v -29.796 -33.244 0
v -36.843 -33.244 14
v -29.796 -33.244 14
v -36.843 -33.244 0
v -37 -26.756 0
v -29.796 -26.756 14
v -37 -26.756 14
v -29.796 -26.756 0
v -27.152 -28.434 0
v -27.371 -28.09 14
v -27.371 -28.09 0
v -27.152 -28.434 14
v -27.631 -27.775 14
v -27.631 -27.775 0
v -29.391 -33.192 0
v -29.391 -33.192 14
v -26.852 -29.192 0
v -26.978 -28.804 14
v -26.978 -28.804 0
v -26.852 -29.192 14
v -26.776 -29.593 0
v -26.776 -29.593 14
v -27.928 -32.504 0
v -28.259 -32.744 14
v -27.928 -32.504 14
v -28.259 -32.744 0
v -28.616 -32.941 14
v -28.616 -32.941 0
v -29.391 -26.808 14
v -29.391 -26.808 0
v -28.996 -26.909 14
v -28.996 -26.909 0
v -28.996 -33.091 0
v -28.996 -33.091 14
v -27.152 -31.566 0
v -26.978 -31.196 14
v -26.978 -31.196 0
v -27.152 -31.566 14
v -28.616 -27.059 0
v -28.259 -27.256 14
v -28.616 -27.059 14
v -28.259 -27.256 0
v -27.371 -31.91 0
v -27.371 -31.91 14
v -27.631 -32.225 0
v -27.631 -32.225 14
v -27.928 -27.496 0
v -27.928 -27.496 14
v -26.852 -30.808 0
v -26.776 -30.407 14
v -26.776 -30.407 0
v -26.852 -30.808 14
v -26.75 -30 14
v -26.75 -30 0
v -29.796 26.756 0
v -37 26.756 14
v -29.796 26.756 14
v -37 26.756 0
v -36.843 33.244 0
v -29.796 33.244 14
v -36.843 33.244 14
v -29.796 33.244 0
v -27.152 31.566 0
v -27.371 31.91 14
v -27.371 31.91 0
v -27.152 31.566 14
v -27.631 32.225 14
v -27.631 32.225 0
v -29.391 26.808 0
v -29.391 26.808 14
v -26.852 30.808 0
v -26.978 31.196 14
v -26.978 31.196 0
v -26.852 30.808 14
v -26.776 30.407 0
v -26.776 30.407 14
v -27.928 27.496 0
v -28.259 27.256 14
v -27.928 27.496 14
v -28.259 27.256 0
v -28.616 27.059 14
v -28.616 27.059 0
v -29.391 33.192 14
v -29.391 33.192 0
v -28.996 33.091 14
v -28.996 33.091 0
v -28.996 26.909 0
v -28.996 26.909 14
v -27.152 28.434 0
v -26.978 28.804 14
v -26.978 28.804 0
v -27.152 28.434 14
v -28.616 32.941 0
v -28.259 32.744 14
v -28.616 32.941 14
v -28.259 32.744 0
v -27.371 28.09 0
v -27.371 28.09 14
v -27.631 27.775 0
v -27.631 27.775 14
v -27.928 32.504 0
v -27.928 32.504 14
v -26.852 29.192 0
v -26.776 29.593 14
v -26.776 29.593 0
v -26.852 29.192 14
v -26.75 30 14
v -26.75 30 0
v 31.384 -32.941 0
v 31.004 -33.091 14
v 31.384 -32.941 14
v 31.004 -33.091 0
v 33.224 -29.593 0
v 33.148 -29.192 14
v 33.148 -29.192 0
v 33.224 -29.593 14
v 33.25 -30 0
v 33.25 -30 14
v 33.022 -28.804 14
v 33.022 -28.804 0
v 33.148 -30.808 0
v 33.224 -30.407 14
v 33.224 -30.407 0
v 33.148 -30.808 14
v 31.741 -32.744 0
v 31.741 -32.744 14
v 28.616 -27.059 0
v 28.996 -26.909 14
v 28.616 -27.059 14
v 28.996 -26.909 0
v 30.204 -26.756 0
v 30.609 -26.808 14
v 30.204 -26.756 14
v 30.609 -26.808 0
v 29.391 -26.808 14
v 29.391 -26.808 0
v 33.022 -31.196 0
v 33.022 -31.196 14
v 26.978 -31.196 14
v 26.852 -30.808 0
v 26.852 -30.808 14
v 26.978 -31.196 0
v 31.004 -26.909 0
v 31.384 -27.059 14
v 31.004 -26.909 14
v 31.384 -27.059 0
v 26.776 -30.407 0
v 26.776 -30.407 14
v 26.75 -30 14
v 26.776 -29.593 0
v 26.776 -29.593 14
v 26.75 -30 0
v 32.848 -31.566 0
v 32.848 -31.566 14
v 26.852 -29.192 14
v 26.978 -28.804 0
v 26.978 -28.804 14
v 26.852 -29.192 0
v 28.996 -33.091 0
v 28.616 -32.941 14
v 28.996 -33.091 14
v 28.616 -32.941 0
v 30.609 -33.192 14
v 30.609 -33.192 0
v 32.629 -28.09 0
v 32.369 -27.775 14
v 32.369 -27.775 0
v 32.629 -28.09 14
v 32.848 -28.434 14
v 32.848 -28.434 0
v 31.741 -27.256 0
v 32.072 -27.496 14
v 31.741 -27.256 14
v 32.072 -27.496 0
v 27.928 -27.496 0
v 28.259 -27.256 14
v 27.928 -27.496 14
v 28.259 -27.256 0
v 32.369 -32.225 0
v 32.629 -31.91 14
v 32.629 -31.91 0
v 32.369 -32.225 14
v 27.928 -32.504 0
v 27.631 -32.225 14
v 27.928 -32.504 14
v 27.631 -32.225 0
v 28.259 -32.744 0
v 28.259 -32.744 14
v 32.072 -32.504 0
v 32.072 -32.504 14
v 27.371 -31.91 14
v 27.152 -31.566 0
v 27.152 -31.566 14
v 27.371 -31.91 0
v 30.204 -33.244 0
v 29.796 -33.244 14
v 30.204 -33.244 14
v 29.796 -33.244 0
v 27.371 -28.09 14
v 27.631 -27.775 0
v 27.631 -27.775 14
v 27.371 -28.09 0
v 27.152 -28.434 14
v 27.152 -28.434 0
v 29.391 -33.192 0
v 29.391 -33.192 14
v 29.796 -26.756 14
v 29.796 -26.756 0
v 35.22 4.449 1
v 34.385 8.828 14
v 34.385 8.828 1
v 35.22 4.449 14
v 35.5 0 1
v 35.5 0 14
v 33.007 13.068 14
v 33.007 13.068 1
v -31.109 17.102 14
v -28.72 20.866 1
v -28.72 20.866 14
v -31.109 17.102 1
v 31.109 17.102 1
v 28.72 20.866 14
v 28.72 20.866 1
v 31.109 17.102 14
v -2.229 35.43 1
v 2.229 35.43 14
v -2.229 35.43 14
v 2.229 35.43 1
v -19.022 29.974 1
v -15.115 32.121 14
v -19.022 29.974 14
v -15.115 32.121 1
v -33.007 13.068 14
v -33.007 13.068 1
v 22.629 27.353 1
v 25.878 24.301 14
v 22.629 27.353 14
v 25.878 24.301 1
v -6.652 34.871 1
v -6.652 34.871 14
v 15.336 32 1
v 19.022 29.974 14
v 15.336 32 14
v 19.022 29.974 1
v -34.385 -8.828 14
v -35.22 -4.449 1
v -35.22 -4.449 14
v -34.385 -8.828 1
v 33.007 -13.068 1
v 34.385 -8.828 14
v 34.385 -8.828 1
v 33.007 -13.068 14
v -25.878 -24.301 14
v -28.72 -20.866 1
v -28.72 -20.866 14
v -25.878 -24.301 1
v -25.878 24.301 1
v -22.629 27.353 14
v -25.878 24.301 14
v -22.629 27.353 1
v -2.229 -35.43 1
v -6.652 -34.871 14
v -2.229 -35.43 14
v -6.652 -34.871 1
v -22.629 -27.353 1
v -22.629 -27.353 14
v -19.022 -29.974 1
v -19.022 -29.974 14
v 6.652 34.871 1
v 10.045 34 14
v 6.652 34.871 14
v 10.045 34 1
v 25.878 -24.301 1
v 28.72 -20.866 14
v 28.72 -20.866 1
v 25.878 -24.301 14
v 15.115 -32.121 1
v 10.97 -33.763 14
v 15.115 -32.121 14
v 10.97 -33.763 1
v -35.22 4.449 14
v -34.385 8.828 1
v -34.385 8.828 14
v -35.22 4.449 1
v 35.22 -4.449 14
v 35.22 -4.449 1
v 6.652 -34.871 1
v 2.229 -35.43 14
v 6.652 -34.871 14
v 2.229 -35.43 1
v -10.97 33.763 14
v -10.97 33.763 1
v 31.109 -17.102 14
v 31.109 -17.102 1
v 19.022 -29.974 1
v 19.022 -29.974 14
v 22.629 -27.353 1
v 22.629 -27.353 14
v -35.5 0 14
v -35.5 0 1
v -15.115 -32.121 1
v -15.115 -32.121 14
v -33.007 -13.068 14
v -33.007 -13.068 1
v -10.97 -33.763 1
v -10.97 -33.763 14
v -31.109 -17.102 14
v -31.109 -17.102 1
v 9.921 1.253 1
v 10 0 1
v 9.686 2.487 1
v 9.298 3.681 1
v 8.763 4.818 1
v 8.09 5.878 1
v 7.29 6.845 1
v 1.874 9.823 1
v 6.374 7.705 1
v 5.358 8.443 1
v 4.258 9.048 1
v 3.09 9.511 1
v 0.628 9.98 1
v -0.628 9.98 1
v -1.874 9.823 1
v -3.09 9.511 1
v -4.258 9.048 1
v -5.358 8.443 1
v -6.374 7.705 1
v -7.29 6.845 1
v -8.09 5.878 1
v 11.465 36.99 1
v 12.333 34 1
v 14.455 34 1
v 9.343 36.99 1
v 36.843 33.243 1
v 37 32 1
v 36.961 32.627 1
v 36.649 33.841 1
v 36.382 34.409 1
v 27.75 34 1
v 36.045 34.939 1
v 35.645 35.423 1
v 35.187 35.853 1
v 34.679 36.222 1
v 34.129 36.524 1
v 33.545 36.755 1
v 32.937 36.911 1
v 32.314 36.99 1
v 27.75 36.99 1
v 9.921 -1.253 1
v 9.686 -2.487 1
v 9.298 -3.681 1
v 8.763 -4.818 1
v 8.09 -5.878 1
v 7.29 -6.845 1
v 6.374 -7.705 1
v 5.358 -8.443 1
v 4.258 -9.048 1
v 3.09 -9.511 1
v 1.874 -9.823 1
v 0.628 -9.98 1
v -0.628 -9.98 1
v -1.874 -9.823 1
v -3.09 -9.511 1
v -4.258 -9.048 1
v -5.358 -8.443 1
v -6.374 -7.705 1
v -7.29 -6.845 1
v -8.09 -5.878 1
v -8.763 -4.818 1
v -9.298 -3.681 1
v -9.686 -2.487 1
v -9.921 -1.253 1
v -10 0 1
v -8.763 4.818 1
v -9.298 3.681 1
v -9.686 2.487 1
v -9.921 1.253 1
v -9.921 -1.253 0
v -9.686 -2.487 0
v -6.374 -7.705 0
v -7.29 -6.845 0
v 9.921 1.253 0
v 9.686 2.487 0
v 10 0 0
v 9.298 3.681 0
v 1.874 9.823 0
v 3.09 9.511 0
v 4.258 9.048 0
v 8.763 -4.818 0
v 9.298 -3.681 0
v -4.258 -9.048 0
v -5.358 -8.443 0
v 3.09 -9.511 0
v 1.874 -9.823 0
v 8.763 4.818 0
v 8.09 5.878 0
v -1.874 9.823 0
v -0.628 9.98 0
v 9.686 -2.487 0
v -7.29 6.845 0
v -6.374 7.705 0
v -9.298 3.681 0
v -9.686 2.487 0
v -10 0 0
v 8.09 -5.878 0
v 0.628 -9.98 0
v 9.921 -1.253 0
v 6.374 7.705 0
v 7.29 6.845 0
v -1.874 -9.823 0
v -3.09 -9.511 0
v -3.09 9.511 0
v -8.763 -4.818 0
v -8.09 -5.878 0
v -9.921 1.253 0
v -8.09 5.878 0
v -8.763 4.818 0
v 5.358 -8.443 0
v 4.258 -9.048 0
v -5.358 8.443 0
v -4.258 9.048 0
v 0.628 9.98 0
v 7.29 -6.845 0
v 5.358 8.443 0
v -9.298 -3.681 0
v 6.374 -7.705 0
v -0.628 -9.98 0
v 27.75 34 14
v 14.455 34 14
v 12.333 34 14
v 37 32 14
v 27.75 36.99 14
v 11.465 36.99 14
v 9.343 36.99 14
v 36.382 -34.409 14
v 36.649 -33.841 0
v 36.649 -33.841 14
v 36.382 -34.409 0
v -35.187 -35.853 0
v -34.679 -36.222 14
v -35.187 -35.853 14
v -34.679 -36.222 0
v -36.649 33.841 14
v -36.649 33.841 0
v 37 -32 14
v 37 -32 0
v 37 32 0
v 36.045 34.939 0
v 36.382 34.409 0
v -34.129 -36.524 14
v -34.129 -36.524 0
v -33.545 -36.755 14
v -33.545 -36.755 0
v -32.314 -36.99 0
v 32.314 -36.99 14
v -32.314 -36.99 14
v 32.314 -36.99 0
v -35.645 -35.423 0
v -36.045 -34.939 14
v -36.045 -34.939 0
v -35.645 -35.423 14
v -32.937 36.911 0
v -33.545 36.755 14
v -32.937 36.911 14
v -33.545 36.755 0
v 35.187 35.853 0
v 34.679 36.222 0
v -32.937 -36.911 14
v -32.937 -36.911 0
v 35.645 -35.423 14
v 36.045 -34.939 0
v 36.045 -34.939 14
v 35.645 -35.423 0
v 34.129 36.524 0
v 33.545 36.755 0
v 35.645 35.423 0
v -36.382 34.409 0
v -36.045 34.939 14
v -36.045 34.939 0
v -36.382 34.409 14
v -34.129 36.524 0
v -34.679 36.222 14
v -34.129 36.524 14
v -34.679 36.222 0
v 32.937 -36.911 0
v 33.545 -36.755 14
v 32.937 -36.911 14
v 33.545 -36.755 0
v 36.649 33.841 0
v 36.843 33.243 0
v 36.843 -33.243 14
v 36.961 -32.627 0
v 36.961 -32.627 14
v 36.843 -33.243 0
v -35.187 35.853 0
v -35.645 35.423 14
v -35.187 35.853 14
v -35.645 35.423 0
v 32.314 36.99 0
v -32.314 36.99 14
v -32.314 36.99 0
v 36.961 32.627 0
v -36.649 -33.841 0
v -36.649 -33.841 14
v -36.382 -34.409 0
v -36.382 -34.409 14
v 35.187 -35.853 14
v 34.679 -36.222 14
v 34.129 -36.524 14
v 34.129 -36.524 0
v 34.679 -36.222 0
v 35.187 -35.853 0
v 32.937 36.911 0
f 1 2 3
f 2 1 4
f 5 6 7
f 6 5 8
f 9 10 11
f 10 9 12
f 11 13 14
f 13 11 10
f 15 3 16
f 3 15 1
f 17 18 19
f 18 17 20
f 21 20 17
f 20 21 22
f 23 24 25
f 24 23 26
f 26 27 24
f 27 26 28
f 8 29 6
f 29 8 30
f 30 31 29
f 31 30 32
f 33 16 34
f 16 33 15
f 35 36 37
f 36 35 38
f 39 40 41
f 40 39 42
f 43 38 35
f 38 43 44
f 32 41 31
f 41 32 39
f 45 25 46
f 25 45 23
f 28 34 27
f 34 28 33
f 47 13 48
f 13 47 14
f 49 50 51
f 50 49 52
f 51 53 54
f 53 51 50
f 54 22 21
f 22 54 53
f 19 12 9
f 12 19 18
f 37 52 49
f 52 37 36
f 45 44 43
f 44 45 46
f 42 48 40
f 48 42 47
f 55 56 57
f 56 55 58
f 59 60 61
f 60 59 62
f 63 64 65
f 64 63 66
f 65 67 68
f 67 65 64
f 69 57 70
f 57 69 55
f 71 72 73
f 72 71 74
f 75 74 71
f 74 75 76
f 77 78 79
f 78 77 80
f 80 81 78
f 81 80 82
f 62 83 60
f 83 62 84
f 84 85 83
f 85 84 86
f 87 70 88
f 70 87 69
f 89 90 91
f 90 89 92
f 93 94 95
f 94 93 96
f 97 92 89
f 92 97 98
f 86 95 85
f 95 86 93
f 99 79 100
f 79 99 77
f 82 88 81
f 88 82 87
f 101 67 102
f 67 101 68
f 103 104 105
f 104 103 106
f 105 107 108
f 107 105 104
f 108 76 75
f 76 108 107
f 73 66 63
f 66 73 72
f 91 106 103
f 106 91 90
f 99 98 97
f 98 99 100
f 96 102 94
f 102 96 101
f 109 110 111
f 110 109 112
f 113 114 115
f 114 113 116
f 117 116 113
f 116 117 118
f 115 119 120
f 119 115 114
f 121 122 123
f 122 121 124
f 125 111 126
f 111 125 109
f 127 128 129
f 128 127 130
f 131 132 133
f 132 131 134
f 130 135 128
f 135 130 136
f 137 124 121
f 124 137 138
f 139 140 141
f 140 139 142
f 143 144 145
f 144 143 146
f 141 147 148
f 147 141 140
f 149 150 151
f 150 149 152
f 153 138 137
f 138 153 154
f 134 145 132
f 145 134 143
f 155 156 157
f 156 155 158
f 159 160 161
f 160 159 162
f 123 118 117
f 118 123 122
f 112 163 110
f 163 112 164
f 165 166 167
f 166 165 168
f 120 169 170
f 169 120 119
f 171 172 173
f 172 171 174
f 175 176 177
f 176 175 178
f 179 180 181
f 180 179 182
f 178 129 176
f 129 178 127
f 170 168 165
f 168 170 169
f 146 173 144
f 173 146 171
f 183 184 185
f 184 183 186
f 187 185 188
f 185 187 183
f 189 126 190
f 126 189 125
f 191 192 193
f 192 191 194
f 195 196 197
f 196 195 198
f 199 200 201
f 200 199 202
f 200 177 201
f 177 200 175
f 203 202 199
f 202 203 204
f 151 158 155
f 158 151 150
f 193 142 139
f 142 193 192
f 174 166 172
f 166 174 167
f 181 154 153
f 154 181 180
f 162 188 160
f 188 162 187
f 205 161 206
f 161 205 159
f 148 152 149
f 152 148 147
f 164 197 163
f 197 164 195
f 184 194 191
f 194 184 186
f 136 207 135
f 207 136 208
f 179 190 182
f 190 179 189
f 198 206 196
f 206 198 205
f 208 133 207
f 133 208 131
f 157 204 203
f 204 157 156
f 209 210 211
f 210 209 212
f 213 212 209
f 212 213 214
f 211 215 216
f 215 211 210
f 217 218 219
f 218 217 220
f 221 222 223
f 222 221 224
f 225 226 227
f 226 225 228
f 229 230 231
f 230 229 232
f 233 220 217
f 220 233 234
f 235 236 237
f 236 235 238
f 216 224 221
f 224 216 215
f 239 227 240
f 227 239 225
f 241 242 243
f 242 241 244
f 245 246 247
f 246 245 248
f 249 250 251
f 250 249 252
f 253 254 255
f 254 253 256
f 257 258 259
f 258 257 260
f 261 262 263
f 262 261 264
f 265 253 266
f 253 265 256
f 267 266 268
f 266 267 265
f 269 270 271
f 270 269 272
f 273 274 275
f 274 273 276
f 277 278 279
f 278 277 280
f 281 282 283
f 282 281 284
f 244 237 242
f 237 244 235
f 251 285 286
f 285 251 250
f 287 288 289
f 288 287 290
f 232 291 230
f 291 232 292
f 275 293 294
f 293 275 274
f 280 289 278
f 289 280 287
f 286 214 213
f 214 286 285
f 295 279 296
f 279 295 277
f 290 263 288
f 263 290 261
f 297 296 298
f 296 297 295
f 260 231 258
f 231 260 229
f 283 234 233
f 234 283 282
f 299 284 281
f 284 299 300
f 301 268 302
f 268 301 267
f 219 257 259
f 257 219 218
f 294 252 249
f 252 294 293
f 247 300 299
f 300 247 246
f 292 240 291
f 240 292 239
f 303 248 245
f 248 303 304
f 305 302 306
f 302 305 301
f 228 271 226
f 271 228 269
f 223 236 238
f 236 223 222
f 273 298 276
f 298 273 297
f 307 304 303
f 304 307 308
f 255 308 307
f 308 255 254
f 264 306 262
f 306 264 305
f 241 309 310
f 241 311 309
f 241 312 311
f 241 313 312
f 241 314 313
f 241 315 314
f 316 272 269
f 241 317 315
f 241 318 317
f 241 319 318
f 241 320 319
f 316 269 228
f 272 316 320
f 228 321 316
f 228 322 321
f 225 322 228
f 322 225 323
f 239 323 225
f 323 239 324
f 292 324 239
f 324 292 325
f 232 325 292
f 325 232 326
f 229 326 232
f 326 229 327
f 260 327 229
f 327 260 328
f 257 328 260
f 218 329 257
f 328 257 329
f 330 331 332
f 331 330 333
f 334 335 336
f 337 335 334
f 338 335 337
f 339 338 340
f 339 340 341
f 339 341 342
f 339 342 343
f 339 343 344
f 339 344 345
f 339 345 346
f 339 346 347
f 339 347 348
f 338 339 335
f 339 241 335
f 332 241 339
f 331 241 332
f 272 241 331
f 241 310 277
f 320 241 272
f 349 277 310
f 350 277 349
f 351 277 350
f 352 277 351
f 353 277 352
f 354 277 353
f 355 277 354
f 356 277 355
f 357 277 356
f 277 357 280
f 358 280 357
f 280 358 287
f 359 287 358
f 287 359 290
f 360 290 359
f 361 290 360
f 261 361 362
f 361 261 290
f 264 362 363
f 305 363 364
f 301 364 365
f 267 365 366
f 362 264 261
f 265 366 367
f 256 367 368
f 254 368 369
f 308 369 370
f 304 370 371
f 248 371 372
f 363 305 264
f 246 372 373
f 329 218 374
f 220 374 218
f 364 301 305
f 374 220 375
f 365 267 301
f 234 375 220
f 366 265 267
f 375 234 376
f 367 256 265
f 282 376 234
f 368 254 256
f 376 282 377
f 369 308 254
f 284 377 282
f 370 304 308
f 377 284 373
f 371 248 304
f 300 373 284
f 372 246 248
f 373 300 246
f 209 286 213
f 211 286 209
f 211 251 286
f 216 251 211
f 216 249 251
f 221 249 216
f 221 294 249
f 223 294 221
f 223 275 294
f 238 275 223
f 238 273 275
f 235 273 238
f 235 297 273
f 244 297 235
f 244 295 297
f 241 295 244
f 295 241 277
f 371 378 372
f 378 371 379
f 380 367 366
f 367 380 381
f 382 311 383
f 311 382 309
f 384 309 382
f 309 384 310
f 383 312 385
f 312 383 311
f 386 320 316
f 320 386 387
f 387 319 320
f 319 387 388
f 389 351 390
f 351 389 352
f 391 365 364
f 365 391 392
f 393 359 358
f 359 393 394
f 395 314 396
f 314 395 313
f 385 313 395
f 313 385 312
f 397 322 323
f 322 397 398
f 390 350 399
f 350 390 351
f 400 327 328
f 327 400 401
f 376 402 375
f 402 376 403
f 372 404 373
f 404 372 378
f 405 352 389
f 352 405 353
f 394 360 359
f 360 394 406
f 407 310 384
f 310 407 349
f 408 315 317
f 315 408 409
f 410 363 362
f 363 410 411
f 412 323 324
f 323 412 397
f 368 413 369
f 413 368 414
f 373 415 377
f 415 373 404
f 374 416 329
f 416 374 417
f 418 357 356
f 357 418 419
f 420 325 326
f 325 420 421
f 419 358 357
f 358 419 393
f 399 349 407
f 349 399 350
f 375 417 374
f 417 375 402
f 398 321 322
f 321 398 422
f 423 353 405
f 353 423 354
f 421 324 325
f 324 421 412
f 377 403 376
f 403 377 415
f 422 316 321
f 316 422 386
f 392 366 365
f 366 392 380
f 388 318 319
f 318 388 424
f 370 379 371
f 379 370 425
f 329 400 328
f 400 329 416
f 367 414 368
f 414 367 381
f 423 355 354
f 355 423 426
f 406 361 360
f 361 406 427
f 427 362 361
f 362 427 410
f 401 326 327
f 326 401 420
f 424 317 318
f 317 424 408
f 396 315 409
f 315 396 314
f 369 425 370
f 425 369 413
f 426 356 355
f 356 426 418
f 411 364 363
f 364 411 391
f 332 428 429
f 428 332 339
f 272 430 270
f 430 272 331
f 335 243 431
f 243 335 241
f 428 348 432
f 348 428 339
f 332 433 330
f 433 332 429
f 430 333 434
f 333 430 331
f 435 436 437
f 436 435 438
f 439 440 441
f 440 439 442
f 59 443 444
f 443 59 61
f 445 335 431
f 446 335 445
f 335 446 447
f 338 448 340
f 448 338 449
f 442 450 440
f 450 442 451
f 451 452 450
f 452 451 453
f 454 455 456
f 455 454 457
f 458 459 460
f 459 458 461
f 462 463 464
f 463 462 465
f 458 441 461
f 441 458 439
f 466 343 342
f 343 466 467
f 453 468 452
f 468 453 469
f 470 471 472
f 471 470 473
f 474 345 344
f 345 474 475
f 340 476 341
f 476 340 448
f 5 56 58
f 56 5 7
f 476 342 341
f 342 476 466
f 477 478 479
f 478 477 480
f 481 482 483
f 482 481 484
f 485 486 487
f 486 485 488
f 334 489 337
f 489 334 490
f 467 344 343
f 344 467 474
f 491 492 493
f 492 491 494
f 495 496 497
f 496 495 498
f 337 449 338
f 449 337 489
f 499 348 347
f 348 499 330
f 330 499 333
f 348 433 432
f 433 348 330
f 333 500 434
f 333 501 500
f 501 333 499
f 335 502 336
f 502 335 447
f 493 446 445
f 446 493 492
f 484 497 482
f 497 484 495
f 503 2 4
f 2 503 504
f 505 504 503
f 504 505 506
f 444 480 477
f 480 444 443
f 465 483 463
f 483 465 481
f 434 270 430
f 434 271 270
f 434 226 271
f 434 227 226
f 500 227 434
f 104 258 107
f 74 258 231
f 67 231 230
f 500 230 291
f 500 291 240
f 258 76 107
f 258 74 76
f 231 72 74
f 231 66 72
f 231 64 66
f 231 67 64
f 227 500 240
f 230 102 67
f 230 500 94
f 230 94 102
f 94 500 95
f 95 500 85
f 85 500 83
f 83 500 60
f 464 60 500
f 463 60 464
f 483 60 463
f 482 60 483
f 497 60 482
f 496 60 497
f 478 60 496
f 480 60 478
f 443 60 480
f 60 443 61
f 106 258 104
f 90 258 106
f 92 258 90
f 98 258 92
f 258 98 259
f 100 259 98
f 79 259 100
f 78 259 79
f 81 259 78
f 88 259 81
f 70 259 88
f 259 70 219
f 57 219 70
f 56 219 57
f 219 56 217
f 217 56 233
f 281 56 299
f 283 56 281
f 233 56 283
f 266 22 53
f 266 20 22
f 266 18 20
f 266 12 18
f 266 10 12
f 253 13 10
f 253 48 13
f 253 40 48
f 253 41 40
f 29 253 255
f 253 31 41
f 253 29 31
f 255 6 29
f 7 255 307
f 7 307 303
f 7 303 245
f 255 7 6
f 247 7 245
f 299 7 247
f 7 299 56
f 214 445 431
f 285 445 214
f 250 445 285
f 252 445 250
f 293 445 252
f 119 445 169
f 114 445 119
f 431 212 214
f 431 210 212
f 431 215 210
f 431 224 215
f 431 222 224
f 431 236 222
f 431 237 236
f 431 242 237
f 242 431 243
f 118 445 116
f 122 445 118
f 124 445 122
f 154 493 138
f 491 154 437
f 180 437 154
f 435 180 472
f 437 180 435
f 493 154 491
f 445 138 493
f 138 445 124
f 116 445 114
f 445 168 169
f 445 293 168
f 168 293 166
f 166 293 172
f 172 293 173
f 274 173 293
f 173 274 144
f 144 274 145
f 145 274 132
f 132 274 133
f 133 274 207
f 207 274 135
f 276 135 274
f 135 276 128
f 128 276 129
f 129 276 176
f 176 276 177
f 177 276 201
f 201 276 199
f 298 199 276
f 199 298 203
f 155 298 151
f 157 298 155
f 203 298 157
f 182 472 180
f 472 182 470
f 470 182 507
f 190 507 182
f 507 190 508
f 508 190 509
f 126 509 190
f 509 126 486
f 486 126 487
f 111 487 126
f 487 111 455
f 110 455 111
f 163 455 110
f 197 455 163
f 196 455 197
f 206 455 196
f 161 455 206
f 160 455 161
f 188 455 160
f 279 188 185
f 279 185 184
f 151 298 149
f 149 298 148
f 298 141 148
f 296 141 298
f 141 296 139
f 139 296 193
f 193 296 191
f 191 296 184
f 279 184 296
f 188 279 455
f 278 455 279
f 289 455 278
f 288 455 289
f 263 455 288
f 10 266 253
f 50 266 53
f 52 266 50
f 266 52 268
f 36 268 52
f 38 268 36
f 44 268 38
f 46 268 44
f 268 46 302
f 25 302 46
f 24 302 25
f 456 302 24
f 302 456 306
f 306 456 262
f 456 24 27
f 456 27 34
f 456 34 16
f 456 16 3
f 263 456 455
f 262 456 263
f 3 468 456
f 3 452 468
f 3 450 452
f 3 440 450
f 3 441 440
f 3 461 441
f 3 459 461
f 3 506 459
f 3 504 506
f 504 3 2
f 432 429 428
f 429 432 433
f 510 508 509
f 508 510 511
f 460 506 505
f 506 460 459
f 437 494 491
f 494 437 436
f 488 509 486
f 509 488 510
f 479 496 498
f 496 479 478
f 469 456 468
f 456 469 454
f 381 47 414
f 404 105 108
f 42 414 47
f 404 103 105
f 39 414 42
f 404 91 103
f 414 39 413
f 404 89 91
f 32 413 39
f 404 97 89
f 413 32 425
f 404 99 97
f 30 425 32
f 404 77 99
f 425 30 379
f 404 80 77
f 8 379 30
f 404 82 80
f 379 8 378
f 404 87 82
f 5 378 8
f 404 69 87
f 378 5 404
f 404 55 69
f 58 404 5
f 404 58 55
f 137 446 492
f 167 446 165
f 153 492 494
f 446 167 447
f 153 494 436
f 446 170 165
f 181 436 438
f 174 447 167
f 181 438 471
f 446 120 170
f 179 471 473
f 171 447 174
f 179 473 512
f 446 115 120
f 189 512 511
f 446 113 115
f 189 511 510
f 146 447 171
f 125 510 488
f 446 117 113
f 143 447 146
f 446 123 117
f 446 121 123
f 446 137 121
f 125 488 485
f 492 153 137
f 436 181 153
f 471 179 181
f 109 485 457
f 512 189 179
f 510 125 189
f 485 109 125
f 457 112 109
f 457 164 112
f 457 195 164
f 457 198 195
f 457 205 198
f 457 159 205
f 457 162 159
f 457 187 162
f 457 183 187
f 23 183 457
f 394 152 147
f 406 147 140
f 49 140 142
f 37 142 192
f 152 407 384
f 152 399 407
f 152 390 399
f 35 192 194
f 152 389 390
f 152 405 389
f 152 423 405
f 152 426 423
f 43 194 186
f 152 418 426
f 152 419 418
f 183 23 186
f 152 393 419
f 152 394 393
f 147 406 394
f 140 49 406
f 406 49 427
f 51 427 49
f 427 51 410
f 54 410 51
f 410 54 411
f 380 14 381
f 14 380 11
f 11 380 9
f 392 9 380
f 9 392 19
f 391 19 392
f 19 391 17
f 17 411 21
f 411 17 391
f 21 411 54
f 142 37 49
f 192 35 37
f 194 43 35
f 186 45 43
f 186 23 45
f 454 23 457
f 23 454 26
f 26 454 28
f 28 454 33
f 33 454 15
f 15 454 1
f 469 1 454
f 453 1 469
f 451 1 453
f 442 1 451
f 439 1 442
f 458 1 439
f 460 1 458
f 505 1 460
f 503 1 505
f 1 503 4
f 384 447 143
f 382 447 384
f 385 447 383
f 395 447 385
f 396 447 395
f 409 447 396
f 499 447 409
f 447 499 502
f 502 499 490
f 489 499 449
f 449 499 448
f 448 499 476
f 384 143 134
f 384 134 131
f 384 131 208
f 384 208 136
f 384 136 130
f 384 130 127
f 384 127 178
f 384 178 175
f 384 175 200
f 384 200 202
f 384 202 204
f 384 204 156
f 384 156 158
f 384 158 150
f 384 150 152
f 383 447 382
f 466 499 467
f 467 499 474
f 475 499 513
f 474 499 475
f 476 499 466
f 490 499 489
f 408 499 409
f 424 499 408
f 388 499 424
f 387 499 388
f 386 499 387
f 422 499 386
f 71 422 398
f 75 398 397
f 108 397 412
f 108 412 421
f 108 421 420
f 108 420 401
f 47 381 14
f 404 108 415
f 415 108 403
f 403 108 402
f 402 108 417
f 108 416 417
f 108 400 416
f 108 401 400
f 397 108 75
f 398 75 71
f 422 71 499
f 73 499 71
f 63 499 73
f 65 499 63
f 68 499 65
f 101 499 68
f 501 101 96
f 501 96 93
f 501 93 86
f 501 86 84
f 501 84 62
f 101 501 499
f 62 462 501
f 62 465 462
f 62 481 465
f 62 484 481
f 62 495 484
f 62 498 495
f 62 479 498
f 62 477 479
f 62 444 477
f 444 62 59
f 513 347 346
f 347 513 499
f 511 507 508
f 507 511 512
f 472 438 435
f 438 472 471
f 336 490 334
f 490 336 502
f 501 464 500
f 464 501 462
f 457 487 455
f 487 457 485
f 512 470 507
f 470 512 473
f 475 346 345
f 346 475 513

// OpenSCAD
$fn = 50;


difference() {
	union() {
		translate(v = [0, 0, 0]) {
			rotate(a = [0, 0, 0]) {
				hull() {
					translate(v = [-32.0000000000, 32.0000000000, 0]) {
						rotate(a = [0, 0, 0]) {
							translate(v = [0, 0, 0]) {
								rotate(a = [0, 0, 0]) {
									cylinder(h = 14, r = 5);
								}
							}
						}
					}
					translate(v = [32.0000000000, 32.0000000000, 0]) {
						rotate(a = [0, 0, 0]) {
							translate(v = [0, 0, 0]) {
								rotate(a = [0, 0, 0]) {
									cylinder(h = 14, r = 5);
								}
							}
						}
					}
					translate(v = [-32.0000000000, -32.0000000000, 0]) {
						rotate(a = [0, 0, 0]) {
							translate(v = [0, 0, 0]) {
								rotate(a = [0, 0, 0]) {
									cylinder(h = 14, r = 5);
								}
							}
						}
					}
					translate(v = [32.0000000000, -32.0000000000, 0]) {
						rotate(a = [0, 0, 0]) {
							translate(v = [0, 0, 0]) {
								rotate(a = [0, 0, 0]) {
									cylinder(h = 14, r = 5);
								}
							}
						}
					}
				}
			}
		}
	}
	union() {
		translate(v = [-37.5000000000, -30.0000000000, -125]) {
			rotate(a = [0, 0, 0]) {
				hull() {
					translate(v = [7.5000000000, 0, 0]) {
						rotate(a = [0, 0, 0]) {
							translate(v = [0, 0, 0]) {
								rotate(a = [0, 0, 0]) {
									cylinder(h = 250, r = 3.2500000000);
								}
							}
						}
					}
					translate(v = [-7.5000000000, 0, 0]) {
						rotate(a = [0, 0, 0]) {
							translate(v = [0, 0, 0]) {
								rotate(a = [0, 0, 0]) {
									cylinder(h = 250, r = 3.2500000000);
								}
							}
						}
					}
				}
			}
		}
		translate(v = [-37.5000000000, 30.0000000000, -125]) {
			rotate(a = [0, 0, 0]) {
				hull() {
					translate(v = [7.5000000000, 0, 0]) {
						rotate(a = [0, 0, 0]) {
							translate(v = [0, 0, 0]) {
								rotate(a = [0, 0, 0]) {
									cylinder(h = 250, r = 3.2500000000);
								}
							}
						}
					}
					translate(v = [-7.5000000000, 0, 0]) {
						rotate(a = [0, 0, 0]) {
							translate(v = [0, 0, 0]) {
								rotate(a = [0, 0, 0]) {
									cylinder(h = 250, r = 3.2500000000);
								}
							}
						}
					}
				}
			}
		}
		translate(v = [30.0000000000, -30.0000000000, -125.0000000000]) {
			rotate(a = [0, 0, 0]) {
				cylinder(h = 250, r = 3.2500000000);
			}
		}
		translate(v = [0, 0, 1.0000000000]) {
			rotate(a = [0, 0, 0]) {
				cylinder(h = 16, r = 35.5000000000);
			}
		}
		translate(v = [0, 0, -7.0000000000]) {
			rotate(a = [0, 0, 0]) {
				cylinder(h = 14, r = 10.0000000000);
			}
		}
		translate(v = [0.0000000000, 32.0000000000, 1]) {
			rotate(a = [0, 0, 0]) {
				cube(size = [37.0000000000, 2, 16]);
			}
		}
		translate(v = [27.7500000000, 32.0000000000, 1]) {
			rotate(a = [0, 0, 0]) {
				cube(size = [9.2500000000, 5, 16]);
			}
		}
		translate(v = [8.5833333333, 37.7500000000, 1]) {
			rotate(a = [0, 0, -45]) {
				cube(size = [7.5000000000, 1.5000000000, 16]);
			}
		}
	}
}
